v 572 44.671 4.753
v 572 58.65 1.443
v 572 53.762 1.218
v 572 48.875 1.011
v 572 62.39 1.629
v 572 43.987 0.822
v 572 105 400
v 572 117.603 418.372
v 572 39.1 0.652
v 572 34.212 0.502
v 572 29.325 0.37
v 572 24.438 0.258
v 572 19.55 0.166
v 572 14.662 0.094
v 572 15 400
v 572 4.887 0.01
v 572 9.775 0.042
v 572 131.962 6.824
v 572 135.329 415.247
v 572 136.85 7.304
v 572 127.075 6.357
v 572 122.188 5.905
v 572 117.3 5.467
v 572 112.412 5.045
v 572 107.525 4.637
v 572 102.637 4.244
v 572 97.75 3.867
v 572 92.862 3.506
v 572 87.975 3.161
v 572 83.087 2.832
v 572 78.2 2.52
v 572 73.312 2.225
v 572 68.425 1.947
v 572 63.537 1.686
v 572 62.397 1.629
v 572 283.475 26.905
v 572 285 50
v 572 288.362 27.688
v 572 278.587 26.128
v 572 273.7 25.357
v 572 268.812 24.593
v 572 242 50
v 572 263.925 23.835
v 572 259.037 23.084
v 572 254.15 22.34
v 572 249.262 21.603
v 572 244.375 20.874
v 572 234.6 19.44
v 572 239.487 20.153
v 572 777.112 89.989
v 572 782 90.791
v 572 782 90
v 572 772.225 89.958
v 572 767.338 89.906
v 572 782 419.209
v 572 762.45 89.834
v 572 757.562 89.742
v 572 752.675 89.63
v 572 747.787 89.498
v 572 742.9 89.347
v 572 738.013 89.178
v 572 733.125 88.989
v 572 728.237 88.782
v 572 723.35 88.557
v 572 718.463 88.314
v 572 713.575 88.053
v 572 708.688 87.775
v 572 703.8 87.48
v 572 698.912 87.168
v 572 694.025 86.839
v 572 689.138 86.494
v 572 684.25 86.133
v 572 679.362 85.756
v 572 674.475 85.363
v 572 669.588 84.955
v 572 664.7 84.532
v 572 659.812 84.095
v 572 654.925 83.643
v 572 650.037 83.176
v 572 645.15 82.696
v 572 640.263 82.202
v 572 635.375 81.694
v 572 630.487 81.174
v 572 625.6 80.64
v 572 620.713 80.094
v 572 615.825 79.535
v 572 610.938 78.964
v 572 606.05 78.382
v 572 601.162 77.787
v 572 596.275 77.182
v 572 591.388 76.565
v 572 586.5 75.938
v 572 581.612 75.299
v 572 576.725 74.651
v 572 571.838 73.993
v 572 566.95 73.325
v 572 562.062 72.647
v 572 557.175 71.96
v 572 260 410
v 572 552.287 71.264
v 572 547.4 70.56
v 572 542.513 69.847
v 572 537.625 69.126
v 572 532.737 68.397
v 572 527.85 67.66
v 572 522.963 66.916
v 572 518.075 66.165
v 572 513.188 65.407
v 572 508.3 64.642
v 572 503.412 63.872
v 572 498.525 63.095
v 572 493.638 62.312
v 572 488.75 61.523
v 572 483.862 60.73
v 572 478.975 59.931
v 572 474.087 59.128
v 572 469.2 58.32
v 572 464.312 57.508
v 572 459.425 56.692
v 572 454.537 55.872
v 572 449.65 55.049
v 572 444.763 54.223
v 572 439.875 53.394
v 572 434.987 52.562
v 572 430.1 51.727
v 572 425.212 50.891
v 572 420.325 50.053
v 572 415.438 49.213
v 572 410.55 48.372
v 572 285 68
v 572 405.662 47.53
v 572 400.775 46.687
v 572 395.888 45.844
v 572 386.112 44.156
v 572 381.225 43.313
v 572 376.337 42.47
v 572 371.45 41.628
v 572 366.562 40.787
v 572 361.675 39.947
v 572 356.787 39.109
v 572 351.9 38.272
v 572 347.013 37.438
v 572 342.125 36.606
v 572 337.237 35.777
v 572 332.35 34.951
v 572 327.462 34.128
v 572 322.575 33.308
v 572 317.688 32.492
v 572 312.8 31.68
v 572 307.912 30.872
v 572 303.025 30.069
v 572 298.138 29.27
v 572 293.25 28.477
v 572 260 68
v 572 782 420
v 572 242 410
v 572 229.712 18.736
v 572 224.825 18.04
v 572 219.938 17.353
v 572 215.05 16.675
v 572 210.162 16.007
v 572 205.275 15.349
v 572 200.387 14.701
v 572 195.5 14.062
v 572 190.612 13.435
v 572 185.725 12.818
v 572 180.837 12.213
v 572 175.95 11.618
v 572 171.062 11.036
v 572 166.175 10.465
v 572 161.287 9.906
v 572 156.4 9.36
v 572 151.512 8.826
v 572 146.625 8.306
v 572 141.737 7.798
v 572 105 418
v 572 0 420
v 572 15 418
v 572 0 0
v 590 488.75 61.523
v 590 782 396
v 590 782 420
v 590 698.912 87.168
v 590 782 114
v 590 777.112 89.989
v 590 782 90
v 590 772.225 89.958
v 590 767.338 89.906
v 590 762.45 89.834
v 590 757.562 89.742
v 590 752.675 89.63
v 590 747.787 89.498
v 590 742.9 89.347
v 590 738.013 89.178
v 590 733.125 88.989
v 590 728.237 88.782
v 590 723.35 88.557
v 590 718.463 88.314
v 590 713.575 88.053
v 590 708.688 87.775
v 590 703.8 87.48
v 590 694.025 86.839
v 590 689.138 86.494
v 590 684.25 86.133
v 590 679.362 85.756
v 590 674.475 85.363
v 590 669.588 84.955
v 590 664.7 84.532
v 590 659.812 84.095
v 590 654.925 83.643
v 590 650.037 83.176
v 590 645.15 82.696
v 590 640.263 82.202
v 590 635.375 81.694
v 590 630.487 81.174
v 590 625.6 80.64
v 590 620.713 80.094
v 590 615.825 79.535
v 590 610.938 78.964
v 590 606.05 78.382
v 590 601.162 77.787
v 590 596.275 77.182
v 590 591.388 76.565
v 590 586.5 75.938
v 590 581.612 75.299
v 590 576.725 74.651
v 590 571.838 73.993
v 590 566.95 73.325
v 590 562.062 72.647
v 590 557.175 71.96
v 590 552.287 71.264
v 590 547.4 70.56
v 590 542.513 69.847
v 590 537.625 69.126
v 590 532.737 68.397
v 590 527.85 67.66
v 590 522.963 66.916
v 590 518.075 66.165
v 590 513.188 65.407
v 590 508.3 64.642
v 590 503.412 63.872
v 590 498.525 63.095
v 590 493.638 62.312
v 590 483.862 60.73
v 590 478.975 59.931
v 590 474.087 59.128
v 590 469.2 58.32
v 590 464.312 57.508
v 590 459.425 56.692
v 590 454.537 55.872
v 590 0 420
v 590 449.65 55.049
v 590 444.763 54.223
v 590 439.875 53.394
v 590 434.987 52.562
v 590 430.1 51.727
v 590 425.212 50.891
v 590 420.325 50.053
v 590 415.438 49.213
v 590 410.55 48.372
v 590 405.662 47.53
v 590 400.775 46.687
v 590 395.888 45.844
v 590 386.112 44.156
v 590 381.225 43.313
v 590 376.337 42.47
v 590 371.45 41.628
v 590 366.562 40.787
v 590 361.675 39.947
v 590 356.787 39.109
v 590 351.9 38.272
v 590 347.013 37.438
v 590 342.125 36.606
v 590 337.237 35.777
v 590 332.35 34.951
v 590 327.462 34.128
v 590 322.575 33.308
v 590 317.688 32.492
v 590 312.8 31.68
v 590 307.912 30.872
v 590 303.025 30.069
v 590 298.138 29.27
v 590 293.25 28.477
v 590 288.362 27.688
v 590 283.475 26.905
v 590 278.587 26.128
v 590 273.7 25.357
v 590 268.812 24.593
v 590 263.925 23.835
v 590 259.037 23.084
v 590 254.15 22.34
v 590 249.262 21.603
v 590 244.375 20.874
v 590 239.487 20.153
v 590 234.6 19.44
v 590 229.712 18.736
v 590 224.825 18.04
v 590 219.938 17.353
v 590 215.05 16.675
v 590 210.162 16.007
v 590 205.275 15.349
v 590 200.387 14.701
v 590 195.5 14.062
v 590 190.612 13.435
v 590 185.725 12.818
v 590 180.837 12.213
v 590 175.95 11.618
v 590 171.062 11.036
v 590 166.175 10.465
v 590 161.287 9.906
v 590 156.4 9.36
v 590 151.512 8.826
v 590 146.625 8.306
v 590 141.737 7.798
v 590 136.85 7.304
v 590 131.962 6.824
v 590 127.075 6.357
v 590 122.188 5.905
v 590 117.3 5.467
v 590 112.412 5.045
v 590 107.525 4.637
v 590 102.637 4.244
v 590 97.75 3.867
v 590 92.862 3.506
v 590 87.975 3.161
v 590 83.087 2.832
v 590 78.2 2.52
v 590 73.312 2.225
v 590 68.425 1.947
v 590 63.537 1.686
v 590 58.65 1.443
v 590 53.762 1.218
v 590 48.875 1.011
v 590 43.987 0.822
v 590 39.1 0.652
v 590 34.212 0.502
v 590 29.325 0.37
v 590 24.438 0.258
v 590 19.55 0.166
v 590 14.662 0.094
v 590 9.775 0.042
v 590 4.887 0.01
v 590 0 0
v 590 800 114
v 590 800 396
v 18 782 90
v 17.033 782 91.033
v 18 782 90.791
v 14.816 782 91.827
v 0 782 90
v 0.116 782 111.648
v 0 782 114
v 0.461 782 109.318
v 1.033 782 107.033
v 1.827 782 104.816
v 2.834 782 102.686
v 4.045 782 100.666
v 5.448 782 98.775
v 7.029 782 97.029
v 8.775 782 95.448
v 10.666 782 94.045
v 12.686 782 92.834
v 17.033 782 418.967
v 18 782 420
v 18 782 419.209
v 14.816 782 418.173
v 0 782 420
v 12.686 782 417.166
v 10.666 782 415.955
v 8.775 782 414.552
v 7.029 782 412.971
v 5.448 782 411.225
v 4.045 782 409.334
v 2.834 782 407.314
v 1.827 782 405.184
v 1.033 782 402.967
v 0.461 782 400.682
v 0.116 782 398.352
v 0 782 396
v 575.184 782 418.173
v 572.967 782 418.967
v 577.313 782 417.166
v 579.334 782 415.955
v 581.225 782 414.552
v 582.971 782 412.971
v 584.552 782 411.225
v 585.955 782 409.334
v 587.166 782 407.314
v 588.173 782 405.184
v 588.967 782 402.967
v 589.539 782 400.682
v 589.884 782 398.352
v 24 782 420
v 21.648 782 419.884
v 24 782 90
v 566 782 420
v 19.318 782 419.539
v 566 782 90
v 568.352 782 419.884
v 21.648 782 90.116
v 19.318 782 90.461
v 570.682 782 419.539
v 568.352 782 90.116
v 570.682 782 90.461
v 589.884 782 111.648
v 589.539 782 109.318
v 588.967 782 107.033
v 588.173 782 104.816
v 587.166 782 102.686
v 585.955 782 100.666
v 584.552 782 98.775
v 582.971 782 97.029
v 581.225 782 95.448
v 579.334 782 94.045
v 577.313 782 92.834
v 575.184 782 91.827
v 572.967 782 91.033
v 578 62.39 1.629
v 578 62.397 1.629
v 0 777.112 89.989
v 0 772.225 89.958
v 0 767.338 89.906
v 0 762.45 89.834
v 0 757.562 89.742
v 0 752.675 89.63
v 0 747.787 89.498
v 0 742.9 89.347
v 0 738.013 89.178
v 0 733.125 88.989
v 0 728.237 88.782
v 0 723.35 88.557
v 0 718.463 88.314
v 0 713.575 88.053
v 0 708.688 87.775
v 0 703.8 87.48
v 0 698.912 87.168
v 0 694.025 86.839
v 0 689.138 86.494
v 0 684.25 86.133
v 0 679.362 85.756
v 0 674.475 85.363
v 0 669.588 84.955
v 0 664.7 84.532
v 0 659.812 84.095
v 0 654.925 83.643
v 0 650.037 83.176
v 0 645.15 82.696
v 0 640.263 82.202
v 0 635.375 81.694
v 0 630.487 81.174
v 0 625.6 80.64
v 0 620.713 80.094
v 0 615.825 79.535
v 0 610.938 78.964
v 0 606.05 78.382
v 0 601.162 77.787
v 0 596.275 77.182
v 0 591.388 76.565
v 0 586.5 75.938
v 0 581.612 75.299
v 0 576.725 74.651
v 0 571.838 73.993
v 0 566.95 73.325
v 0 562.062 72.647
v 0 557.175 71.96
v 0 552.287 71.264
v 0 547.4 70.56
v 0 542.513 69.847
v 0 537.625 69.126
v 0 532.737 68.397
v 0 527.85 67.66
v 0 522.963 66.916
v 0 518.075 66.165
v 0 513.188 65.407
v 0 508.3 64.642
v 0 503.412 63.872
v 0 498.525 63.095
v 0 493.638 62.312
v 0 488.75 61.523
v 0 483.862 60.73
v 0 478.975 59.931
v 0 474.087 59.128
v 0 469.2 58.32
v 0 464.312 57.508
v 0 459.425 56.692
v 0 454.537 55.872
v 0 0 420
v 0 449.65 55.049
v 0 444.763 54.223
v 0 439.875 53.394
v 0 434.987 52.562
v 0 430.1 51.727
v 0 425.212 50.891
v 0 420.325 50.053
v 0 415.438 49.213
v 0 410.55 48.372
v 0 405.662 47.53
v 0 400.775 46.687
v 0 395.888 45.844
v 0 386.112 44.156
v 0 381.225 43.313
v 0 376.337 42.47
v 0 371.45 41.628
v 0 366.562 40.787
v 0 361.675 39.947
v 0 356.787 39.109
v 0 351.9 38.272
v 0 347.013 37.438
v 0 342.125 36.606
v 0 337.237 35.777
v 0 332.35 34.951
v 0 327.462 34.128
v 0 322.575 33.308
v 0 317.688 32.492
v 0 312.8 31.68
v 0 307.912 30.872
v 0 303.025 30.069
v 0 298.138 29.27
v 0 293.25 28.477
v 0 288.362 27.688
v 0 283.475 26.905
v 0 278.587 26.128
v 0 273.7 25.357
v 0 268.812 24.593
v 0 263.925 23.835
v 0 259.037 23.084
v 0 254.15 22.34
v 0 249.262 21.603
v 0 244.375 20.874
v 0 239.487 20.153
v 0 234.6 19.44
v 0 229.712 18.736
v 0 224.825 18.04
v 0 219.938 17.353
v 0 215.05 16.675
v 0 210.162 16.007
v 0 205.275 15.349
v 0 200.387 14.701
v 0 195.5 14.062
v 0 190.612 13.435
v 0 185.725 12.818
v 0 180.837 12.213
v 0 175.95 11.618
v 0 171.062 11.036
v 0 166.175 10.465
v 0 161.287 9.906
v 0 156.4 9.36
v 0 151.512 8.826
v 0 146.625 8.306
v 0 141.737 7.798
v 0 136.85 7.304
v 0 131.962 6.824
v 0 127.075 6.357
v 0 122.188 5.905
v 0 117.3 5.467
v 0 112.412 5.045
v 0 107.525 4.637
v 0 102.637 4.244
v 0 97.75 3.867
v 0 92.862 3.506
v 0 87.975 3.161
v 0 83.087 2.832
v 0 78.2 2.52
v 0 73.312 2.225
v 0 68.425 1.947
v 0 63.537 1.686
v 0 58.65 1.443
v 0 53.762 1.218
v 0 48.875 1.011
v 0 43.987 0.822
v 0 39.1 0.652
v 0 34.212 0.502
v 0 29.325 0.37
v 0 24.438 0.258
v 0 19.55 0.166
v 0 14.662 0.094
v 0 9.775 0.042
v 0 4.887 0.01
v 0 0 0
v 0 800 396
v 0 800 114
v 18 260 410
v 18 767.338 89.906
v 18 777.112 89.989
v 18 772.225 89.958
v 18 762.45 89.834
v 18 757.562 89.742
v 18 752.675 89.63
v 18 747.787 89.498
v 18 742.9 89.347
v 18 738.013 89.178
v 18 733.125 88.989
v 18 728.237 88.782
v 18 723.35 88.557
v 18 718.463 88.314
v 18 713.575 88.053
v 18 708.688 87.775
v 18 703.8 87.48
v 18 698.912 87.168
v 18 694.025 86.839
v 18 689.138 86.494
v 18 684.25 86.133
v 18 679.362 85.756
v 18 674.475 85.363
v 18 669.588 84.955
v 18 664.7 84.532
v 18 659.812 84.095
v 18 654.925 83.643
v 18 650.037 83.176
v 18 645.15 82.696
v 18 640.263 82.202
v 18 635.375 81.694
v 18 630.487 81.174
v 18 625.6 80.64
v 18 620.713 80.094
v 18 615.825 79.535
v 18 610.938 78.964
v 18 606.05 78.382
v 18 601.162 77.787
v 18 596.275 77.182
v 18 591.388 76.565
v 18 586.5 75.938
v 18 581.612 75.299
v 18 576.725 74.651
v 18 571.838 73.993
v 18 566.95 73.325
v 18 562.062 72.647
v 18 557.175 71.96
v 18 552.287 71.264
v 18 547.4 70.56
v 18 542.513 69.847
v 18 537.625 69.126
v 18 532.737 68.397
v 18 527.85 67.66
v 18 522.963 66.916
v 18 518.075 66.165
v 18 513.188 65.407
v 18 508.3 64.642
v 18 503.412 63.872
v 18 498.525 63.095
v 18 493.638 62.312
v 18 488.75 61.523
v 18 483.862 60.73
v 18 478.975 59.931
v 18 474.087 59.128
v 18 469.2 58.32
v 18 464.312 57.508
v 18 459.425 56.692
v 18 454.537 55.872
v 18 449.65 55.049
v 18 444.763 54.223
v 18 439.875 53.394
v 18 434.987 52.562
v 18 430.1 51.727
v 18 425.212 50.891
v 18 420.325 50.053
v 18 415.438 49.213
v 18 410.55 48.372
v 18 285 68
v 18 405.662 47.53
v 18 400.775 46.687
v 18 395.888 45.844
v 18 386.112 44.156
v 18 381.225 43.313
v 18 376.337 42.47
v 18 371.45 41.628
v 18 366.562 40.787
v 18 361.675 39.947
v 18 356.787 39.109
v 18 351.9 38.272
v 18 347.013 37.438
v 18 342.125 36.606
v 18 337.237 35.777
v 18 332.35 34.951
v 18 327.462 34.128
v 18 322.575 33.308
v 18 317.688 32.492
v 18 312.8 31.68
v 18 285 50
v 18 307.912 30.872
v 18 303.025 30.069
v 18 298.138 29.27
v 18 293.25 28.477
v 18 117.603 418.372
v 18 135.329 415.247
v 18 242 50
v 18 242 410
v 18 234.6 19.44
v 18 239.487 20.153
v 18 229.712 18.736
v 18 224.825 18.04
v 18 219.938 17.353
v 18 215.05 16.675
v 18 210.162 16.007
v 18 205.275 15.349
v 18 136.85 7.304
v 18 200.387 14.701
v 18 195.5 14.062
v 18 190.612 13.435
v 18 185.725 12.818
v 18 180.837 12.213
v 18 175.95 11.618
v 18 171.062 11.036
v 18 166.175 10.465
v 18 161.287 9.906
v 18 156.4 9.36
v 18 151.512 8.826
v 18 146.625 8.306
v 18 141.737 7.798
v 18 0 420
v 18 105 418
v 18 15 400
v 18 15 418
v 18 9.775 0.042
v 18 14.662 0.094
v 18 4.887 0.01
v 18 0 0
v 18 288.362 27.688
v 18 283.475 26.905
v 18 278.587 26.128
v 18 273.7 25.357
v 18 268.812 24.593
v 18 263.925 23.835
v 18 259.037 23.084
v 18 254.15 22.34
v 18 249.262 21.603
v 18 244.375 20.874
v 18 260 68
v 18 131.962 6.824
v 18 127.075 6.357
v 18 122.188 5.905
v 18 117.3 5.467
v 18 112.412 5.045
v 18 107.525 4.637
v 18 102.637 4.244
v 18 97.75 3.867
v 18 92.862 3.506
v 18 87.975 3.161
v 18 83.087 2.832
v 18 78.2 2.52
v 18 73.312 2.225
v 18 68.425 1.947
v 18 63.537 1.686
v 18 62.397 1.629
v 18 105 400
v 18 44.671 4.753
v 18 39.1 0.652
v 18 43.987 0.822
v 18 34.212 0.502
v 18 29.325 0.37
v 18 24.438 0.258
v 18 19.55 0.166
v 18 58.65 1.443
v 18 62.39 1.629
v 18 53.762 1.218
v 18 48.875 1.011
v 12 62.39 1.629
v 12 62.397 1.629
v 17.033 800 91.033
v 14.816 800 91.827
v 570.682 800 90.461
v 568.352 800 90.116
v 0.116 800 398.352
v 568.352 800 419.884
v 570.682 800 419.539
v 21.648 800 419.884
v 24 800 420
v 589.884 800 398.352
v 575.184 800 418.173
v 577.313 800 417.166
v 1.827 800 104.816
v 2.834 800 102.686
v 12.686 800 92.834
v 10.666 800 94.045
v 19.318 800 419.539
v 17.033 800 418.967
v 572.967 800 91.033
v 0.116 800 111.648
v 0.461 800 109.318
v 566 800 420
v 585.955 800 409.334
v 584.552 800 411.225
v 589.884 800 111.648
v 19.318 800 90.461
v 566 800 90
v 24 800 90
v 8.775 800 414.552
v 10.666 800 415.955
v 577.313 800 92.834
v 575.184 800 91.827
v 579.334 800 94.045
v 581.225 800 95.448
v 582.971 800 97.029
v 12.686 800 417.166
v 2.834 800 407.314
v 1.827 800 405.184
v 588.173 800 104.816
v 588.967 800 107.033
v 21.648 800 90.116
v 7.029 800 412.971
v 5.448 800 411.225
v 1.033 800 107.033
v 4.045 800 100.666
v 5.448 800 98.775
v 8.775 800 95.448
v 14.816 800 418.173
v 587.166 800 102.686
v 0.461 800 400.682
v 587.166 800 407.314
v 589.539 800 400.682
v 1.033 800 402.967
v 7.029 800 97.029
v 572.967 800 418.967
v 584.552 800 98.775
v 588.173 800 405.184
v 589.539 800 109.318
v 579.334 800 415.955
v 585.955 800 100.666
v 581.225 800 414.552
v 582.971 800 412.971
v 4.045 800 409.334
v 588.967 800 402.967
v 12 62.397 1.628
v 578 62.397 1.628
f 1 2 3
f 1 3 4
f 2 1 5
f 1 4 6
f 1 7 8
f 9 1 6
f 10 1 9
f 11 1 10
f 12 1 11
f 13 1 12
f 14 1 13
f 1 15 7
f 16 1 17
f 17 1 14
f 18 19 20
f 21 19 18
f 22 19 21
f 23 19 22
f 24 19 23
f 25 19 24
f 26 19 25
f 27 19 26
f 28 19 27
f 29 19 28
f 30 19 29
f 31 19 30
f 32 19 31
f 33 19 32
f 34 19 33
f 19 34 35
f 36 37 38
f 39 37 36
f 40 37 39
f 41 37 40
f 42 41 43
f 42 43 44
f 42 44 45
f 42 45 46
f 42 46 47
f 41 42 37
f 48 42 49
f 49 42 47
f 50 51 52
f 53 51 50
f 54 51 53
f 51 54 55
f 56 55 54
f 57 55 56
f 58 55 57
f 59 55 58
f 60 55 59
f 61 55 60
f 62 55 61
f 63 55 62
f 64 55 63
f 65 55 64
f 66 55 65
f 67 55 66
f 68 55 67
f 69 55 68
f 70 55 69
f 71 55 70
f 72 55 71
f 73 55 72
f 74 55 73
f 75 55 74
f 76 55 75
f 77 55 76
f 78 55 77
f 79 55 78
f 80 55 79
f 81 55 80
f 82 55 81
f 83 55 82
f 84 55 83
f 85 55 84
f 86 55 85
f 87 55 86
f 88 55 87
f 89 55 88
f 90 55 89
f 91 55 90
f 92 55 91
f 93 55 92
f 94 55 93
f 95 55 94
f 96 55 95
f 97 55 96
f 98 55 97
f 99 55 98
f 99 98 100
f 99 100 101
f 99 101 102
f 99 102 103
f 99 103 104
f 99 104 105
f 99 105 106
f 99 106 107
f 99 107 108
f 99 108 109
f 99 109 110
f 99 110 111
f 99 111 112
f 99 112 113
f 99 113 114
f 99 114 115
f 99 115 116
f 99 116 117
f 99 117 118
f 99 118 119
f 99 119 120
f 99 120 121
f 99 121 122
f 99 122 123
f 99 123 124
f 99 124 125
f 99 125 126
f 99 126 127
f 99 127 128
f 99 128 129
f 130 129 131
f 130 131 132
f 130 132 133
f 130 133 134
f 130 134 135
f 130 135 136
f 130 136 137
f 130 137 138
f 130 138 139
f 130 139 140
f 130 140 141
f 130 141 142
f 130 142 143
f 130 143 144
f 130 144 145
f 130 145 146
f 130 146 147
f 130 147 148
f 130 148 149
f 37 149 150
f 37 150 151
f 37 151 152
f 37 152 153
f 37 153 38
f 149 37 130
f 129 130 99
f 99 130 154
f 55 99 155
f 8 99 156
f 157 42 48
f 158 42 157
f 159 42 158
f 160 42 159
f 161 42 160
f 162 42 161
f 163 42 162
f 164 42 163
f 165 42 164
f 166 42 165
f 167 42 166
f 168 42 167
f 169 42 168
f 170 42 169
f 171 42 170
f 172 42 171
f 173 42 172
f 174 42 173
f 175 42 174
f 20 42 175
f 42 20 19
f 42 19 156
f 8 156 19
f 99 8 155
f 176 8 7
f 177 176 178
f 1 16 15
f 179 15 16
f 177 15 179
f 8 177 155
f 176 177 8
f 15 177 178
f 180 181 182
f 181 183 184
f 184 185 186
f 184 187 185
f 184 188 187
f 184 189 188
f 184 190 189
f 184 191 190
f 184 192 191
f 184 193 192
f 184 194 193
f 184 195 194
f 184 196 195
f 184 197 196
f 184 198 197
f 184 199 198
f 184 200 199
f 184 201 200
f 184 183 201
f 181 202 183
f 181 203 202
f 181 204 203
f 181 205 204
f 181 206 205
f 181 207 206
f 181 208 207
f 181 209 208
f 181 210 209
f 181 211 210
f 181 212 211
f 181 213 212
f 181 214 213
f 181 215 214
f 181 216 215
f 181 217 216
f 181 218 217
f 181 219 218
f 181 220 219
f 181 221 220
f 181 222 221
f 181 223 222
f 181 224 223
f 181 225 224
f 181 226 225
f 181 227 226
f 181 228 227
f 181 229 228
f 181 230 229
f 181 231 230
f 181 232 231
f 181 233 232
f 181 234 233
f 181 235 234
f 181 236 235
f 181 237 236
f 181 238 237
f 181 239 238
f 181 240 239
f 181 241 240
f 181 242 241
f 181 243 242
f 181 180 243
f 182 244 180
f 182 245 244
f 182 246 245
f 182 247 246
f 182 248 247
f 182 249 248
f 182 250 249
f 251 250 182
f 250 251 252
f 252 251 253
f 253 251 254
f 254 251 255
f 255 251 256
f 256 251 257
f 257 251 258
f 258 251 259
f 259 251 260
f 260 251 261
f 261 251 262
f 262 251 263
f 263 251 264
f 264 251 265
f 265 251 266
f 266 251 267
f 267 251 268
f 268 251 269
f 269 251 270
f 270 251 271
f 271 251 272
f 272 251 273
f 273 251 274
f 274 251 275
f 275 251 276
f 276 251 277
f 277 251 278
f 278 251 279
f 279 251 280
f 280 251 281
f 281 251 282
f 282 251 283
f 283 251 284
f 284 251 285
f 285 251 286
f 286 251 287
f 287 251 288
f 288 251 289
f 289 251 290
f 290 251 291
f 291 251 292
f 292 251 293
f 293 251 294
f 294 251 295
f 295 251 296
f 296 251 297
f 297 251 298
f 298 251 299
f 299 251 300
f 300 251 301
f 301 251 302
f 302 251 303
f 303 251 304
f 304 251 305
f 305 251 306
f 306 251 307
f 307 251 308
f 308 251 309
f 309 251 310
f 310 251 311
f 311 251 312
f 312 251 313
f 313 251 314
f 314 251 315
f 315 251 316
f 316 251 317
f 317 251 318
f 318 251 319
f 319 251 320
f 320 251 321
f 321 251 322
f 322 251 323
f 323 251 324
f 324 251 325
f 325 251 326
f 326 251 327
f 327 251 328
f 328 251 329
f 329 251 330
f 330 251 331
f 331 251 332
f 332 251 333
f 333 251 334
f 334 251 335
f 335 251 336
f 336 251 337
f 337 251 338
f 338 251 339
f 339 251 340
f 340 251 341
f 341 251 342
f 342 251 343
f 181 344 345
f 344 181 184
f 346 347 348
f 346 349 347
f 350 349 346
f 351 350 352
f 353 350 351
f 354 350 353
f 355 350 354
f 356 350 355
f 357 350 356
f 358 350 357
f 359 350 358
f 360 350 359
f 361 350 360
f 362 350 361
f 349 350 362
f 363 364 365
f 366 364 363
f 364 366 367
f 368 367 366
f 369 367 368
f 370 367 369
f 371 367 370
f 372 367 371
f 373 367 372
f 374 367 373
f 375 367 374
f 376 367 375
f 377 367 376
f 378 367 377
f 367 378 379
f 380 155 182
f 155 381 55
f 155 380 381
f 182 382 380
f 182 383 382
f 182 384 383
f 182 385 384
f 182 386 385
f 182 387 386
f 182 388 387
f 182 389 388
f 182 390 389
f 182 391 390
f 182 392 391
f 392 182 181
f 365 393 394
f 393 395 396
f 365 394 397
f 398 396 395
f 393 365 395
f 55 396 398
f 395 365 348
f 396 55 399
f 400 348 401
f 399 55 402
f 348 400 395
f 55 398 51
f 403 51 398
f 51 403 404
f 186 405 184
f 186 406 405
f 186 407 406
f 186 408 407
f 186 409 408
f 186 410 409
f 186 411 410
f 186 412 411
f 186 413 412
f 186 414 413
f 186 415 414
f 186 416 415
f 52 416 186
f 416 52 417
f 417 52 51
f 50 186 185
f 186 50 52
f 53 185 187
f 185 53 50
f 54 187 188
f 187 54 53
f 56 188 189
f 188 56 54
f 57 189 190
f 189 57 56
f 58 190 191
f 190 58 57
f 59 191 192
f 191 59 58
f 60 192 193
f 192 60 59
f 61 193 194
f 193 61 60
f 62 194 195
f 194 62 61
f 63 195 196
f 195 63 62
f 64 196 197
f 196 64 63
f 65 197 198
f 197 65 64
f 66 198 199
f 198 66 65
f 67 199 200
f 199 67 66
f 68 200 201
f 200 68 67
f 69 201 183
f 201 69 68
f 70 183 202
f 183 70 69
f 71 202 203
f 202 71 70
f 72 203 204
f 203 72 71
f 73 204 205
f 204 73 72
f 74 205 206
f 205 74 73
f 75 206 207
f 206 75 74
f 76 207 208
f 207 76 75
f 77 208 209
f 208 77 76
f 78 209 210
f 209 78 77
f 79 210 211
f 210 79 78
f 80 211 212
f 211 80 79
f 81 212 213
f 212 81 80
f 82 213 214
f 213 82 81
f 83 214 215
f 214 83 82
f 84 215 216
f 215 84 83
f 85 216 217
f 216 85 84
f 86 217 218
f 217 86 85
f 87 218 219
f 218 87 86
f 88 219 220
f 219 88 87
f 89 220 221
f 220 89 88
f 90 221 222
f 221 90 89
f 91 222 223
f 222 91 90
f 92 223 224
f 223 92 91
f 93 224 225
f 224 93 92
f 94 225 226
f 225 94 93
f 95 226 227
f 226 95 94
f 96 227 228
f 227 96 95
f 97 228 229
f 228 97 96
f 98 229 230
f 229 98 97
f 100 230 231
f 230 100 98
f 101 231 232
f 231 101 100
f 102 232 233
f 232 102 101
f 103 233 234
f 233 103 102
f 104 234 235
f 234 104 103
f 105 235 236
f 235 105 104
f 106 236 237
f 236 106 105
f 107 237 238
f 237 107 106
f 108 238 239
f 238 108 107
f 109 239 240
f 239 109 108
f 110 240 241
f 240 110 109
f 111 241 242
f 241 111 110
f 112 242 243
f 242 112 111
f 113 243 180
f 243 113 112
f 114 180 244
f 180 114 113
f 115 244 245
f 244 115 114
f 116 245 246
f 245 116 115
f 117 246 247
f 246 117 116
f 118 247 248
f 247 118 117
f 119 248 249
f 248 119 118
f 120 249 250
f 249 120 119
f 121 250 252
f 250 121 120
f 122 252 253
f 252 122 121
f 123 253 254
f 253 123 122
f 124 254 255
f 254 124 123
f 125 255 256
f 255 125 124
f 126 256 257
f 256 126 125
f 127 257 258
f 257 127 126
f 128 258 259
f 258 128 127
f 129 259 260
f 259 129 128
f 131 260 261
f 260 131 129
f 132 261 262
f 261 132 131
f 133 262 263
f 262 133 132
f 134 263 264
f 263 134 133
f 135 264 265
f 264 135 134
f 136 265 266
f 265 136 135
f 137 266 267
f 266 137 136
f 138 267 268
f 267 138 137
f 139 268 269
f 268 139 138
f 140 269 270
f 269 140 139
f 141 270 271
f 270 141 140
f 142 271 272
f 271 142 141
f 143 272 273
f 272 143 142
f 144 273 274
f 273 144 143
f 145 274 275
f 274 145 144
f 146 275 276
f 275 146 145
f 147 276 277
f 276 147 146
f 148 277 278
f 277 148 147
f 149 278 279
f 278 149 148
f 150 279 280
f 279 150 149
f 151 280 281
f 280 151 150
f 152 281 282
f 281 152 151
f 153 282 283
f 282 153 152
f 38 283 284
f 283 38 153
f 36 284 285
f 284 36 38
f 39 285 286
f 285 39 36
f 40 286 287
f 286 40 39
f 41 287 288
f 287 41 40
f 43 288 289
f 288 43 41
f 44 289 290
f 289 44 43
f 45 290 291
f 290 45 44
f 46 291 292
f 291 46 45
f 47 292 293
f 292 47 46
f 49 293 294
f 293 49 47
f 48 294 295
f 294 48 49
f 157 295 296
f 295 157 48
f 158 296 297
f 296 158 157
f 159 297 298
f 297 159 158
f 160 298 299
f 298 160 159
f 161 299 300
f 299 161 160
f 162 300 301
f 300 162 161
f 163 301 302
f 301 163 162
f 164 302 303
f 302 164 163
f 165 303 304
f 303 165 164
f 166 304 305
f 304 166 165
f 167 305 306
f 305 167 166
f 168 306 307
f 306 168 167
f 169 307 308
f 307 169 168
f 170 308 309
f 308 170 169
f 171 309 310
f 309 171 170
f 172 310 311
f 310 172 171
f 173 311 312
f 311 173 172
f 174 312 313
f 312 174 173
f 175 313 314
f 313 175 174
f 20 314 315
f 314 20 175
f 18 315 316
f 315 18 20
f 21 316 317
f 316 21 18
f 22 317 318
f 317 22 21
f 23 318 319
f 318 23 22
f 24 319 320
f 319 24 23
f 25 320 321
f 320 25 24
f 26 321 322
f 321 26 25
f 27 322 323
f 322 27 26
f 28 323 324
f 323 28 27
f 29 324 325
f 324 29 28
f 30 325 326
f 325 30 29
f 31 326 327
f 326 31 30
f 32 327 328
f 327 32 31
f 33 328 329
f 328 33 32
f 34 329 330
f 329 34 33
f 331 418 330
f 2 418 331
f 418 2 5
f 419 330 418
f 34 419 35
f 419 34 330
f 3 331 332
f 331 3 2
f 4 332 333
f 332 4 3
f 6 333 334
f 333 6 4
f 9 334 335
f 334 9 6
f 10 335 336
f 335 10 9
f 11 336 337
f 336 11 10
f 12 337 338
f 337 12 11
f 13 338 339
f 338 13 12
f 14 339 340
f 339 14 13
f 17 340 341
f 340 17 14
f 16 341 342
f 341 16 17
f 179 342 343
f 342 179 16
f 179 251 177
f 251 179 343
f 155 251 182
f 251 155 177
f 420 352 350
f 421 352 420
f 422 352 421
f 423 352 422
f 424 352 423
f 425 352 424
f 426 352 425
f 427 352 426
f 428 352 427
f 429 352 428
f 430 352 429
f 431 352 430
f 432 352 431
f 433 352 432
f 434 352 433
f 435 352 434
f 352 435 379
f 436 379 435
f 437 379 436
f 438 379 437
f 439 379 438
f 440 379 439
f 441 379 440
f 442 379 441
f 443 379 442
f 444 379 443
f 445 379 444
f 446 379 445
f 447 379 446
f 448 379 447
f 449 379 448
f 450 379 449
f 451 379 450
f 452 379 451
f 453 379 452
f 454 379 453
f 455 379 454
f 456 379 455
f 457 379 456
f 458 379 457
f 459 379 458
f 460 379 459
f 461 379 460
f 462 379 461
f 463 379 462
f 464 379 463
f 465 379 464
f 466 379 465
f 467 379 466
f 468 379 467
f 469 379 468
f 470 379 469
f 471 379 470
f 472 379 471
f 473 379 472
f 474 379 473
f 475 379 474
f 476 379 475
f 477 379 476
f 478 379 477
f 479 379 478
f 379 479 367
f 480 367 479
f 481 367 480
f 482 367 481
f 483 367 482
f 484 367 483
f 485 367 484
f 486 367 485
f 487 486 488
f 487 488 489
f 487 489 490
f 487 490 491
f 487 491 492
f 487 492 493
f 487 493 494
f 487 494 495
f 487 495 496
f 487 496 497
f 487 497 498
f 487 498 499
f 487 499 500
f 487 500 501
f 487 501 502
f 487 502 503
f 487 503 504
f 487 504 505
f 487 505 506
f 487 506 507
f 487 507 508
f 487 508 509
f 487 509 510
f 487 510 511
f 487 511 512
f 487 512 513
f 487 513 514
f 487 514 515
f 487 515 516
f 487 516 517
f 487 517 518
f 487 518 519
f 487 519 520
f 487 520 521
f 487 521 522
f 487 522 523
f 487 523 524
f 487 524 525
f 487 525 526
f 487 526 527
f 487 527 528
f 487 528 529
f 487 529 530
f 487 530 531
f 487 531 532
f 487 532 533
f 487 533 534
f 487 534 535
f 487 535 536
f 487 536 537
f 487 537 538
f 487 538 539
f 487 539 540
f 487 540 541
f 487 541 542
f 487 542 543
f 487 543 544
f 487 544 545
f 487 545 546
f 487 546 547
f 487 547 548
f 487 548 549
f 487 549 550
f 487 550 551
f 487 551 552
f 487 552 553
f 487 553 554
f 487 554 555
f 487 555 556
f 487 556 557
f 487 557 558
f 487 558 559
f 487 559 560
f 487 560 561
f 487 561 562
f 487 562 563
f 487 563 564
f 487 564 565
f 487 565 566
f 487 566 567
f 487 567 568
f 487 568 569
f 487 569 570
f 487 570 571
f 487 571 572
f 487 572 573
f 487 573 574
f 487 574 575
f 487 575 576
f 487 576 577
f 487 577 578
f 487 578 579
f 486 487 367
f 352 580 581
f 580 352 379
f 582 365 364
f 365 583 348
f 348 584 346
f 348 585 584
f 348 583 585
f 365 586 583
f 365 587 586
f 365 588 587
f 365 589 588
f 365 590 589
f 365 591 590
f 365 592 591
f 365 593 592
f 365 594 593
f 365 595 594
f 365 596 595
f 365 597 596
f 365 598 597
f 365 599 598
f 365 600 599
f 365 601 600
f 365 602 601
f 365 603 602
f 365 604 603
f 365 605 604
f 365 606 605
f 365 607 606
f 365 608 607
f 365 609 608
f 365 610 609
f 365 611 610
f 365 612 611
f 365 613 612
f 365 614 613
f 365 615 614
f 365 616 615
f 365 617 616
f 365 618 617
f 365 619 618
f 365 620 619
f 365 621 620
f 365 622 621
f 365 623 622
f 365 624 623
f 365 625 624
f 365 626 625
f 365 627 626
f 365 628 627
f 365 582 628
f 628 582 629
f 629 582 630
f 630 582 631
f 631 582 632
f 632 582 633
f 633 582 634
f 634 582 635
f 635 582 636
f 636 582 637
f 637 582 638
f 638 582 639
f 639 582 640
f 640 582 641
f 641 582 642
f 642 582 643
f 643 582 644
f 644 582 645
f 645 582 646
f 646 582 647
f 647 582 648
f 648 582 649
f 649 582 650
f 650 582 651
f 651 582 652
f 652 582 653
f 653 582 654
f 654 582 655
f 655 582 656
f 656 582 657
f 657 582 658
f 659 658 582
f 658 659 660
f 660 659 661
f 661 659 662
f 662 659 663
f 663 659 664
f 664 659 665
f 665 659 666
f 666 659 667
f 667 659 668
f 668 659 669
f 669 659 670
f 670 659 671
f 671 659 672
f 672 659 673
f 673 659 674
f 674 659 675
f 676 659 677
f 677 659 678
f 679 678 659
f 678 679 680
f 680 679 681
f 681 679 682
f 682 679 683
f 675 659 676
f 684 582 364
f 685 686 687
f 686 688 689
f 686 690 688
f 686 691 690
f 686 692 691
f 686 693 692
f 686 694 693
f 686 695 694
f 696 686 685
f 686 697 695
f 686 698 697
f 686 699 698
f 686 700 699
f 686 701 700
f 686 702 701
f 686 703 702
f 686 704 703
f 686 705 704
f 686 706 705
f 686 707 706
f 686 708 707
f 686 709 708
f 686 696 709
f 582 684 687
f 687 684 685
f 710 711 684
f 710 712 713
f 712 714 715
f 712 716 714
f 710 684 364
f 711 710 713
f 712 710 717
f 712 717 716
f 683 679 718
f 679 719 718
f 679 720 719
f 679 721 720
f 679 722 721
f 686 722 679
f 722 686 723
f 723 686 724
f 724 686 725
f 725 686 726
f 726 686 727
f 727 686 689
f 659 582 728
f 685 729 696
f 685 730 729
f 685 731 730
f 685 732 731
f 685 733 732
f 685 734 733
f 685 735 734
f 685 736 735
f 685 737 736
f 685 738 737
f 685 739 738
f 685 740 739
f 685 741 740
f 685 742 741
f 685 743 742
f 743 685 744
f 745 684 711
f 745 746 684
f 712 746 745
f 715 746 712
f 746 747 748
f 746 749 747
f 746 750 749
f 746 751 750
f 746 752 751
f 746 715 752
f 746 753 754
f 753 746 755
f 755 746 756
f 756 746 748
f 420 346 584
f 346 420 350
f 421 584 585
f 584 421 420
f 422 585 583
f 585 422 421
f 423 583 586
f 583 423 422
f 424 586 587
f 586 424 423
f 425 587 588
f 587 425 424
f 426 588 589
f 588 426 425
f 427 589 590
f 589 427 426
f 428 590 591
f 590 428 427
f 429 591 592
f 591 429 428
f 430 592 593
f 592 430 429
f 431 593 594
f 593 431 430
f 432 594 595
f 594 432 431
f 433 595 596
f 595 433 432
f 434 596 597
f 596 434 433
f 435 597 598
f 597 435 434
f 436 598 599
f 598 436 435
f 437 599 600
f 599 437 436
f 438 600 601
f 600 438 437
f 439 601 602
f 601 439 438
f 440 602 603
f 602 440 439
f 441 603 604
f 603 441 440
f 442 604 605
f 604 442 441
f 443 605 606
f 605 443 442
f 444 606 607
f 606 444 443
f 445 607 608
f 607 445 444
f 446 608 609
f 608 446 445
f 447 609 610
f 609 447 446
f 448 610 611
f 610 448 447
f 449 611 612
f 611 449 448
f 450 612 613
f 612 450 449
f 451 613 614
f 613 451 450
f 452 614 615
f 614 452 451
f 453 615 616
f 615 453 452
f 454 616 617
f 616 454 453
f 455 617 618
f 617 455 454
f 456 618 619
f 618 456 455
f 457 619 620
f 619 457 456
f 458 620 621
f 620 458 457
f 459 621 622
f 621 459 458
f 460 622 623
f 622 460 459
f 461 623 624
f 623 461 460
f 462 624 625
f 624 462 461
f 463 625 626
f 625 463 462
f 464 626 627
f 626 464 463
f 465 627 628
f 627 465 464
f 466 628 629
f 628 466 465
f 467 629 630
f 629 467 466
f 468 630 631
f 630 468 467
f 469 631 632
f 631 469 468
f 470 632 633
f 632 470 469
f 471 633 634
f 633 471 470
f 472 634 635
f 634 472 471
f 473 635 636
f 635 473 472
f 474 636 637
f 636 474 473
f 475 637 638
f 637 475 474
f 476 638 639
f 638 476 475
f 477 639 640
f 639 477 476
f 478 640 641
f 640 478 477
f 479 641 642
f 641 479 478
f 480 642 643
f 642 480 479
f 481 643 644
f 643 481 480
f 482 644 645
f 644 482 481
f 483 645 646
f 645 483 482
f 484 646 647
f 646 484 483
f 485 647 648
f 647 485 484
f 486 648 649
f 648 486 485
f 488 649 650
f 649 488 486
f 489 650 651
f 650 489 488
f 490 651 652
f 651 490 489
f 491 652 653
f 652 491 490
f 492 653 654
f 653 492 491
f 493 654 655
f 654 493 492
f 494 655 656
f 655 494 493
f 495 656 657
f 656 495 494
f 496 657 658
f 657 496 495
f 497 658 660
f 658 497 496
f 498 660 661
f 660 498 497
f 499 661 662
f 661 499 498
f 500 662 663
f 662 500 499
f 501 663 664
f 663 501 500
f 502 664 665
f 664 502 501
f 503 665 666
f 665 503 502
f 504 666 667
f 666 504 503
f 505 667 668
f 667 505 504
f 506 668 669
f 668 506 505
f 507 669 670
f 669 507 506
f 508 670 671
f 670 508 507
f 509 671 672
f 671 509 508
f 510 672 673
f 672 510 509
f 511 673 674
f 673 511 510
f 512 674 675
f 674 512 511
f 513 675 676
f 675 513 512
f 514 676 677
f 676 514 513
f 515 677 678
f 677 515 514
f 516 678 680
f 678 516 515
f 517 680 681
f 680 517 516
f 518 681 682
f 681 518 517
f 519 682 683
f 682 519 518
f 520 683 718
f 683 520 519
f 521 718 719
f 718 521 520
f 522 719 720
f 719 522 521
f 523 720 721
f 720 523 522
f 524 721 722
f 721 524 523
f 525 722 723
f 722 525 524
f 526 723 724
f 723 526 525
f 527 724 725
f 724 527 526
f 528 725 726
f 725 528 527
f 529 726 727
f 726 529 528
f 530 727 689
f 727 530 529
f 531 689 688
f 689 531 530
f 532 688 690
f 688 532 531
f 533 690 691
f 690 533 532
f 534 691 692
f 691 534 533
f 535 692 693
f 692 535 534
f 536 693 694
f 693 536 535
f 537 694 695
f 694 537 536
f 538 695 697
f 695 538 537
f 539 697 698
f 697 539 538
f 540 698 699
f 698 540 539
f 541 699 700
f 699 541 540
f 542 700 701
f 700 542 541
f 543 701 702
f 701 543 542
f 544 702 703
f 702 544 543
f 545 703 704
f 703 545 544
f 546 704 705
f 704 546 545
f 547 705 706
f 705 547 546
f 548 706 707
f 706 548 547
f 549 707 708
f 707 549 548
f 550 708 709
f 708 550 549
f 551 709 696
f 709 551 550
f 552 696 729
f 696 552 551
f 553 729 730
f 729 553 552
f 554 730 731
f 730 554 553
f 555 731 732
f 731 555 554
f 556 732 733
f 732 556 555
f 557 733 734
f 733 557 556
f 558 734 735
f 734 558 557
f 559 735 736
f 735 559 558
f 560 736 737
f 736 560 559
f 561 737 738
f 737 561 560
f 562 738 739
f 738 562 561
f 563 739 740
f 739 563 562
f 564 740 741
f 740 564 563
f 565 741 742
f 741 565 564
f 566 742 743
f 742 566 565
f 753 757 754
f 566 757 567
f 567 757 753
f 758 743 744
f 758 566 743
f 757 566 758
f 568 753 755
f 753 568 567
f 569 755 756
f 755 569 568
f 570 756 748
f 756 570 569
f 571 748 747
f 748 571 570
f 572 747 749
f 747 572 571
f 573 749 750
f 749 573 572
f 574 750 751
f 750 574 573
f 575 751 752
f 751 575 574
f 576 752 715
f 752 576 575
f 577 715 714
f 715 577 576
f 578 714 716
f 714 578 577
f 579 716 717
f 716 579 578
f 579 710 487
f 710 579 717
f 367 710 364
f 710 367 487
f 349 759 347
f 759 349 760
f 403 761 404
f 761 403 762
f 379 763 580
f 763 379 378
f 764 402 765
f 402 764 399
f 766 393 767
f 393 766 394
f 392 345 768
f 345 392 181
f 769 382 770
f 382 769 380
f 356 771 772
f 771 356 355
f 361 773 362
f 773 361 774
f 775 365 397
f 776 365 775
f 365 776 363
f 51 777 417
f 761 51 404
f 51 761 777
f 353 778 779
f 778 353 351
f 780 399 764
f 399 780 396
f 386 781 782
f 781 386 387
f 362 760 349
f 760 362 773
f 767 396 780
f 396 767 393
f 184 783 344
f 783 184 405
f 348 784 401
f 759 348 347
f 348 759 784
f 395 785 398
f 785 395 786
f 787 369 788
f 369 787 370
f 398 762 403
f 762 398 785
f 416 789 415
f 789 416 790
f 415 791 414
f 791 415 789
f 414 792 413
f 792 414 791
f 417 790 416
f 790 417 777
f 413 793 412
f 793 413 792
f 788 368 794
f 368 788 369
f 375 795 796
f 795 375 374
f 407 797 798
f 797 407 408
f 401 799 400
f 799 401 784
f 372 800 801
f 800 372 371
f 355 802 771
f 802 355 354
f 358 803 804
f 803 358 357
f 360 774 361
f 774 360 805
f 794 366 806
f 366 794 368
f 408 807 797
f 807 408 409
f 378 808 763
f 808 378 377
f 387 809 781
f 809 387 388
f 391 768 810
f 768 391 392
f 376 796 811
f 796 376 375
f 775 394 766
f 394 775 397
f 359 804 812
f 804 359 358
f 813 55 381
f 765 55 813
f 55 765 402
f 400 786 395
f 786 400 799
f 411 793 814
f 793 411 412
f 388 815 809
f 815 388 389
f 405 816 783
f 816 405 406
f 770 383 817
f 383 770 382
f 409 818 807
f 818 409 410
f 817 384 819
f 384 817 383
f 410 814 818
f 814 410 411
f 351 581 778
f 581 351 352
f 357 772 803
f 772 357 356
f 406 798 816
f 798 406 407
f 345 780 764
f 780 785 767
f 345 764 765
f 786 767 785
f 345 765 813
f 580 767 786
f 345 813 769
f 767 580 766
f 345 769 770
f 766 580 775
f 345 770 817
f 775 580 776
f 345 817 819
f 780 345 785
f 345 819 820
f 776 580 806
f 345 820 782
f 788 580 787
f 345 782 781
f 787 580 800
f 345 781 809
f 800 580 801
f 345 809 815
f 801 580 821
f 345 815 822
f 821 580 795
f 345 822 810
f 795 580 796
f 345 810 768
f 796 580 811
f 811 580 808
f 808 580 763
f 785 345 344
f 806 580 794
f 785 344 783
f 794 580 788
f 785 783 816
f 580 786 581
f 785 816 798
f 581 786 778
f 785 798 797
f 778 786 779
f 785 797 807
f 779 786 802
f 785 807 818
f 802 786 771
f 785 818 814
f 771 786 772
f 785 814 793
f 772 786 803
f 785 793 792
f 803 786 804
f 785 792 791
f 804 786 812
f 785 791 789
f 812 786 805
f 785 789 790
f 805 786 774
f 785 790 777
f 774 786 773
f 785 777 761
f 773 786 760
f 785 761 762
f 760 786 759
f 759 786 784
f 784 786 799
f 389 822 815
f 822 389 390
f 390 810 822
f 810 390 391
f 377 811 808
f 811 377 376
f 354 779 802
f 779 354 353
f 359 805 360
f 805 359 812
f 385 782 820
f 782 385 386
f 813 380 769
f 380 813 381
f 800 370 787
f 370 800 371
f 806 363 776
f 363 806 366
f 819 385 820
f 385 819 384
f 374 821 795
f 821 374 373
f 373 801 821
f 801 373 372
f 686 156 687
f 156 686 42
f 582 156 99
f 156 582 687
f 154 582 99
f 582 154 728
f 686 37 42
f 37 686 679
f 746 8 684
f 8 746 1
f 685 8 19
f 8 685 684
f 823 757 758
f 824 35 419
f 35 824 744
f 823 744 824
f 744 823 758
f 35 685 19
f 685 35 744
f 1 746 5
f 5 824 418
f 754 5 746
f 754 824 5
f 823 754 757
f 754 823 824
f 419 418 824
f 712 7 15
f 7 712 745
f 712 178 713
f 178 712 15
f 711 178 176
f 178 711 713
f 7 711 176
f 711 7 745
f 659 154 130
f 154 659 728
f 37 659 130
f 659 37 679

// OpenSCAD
// R5. Millimetres. Nominal assembly; dado machining not modelled.
multmatrix([[0, 0, 1, 572], [0, 1, 0, 0], [1, 0, 0, 0], [0, 0, 0, 1]]) linear_extrude(height=18) polygon([[0.0, 0.0], [0.010503, 4.8875], [0.041836, 9.775], [0.093735, 14.6625], [0.165938, 19.55], [0.258179, 24.4375], [0.370195, 29.325], [0.501724, 34.2125], [0.6525, 39.1], [0.822261, 43.9875], [1.010742, 48.875], [1.217681, 53.7625], [1.442813, 58.65], [1.685874, 63.5375], [1.946602, 68.425], [2.224731, 73.3125], [2.52, 78.2], [2.832144, 83.0875], [3.160898, 87.975], [3.506001, 92.8625], [3.867188, 97.75], [4.244194, 102.6375], [4.636758, 107.525], [5.044614, 112.4125], [5.4675, 117.3], [5.905151, 122.1875], [6.357305, 127.075], [6.823696, 131.9625], [7.304062, 136.85], [7.79814, 141.7375], [8.305664, 146.625], [8.826372, 151.5125], [9.36, 156.4], [9.906284, 161.2875], [10.464961, 166.175], [11.035767, 171.0625], [11.618438, 175.95], [12.21271, 180.8375], [12.81832, 185.725], [13.435005, 190.6125], [14.0625, 195.5], [14.700542, 200.3875], [15.348867, 205.275], [16.007212, 210.1625], [16.675313, 215.05], [17.352905, 219.9375], [18.039727, 224.825], [18.735513, 229.7125], [19.44, 234.6], [20.152925, 239.4875], [20.874023, 244.375], [21.603032, 249.2625], [22.339688, 254.15], [23.083726, 259.0375], [23.834883, 263.925], [24.592896, 268.8125], [25.3575, 273.7], [26.128433, 278.5875], [26.90543, 283.475], [27.688228, 288.3625], [28.476562, 293.25], [29.270171, 298.1375], [30.068789, 303.025], [30.872153, 307.9125], [31.68, 312.8], [32.492065, 317.6875], [33.308086, 322.575], [34.127798, 327.4625], [34.950937, 332.35], [35.777241, 337.2375], [36.606445, 342.125], [37.438286, 347.0125], [38.2725, 351.9], [39.108823, 356.7875], [39.946992, 361.675], [40.786743, 366.5625], [41.627812, 371.45], [42.469937, 376.3375], [43.312852, 381.225], [44.156294, 386.1125], [45.0, 391.0], [45.843706, 395.8875], [46.687148, 400.775], [47.530063, 405.6625], [48.372188, 410.55], [49.213257, 415.4375], [50.053008, 420.325], [50.891177, 425.2125], [51.7275, 430.1], [52.561714, 434.9875], [53.393555, 439.875], [54.222759, 444.7625], [55.049062, 449.65], [55.872202, 454.5375], [56.691914, 459.425], [57.507935, 464.3125], [58.32, 469.2], [59.127847, 474.0875], [59.931211, 478.975], [60.729829, 483.8625], [61.523438, 488.75], [62.311772, 493.6375], [63.09457, 498.525], [63.871567, 503.4125], [64.6425, 508.3], [65.407104, 513.1875], [66.165117, 518.075], [66.916274, 522.9625], [67.660313, 527.85], [68.396968, 532.7375], [69.125977, 537.625], [69.847075, 542.5125], [70.56, 547.4], [71.264487, 552.2875], [71.960273, 557.175], [72.647095, 562.0625], [73.324688, 566.95], [73.992788, 571.8375], [74.651133, 576.725], [75.299458, 581.6125], [75.9375, 586.5], [76.564995, 591.3875], [77.18168, 596.275], [77.78729, 601.1625], [78.381563, 606.05], [78.964233, 610.9375], [79.535039, 615.825], [80.093716, 620.7125], [80.64, 625.6], [81.173628, 630.4875], [81.694336, 635.375], [82.20186, 640.2625], [82.695937, 645.15], [83.176304, 650.0375], [83.642695, 654.925], [84.094849, 659.8125], [84.5325, 664.7], [84.955386, 669.5875], [85.363242, 674.475], [85.755806, 679.3625], [86.132812, 684.25], [86.493999, 689.1375], [86.839102, 694.025], [87.167856, 698.9125], [87.48, 703.8], [87.775269, 708.6875], [88.053398, 713.575], [88.314126, 718.4625], [88.557188, 723.35], [88.782319, 728.2375], [88.989258, 733.125], [89.177739, 738.0125], [89.3475, 742.9], [89.498276, 747.7875], [89.629805, 752.675], [89.741821, 757.5625], [89.834063, 762.45], [89.906265, 767.3375], [89.958164, 772.225], [89.989497, 777.1125], [90.0, 782.0], [420, 782], [420, 0]]);
multmatrix([[0, 0, 1, 0], [0, 1, 0, 0], [1, 0, 0, 0], [0, 0, 0, 1]]) linear_extrude(height=18) polygon([[0.0, 0.0], [0.010503, 4.8875], [0.041836, 9.775], [0.093735, 14.6625], [0.165938, 19.55], [0.258179, 24.4375], [0.370195, 29.325], [0.501724, 34.2125], [0.6525, 39.1], [0.822261, 43.9875], [1.010742, 48.875], [1.217681, 53.7625], [1.442813, 58.65], [1.685874, 63.5375], [1.946602, 68.425], [2.224731, 73.3125], [2.52, 78.2], [2.832144, 83.0875], [3.160898, 87.975], [3.506001, 92.8625], [3.867188, 97.75], [4.244194, 102.6375], [4.636758, 107.525], [5.044614, 112.4125], [5.4675, 117.3], [5.905151, 122.1875], [6.357305, 127.075], [6.823696, 131.9625], [7.304062, 136.85], [7.79814, 141.7375], [8.305664, 146.625], [8.826372, 151.5125], [9.36, 156.4], [9.906284, 161.2875], [10.464961, 166.175], [11.035767, 171.0625], [11.618438, 175.95], [12.21271, 180.8375], [12.81832, 185.725], [13.435005, 190.6125], [14.0625, 195.5], [14.700542, 200.3875], [15.348867, 205.275], [16.007212, 210.1625], [16.675313, 215.05], [17.352905, 219.9375], [18.039727, 224.825], [18.735513, 229.7125], [19.44, 234.6], [20.152925, 239.4875], [20.874023, 244.375], [21.603032, 249.2625], [22.339688, 254.15], [23.083726, 259.0375], [23.834883, 263.925], [24.592896, 268.8125], [25.3575, 273.7], [26.128433, 278.5875], [26.90543, 283.475], [27.688228, 288.3625], [28.476562, 293.25], [29.270171, 298.1375], [30.068789, 303.025], [30.872153, 307.9125], [31.68, 312.8], [32.492065, 317.6875], [33.308086, 322.575], [34.127798, 327.4625], [34.950937, 332.35], [35.777241, 337.2375], [36.606445, 342.125], [37.438286, 347.0125], [38.2725, 351.9], [39.108823, 356.7875], [39.946992, 361.675], [40.786743, 366.5625], [41.627812, 371.45], [42.469937, 376.3375], [43.312852, 381.225], [44.156294, 386.1125], [45.0, 391.0], [45.843706, 395.8875], [46.687148, 400.775], [47.530063, 405.6625], [48.372188, 410.55], [49.213257, 415.4375], [50.053008, 420.325], [50.891177, 425.2125], [51.7275, 430.1], [52.561714, 434.9875], [53.393555, 439.875], [54.222759, 444.7625], [55.049062, 449.65], [55.872202, 454.5375], [56.691914, 459.425], [57.507935, 464.3125], [58.32, 469.2], [59.127847, 474.0875], [59.931211, 478.975], [60.729829, 483.8625], [61.523438, 488.75], [62.311772, 493.6375], [63.09457, 498.525], [63.871567, 503.4125], [64.6425, 508.3], [65.407104, 513.1875], [66.165117, 518.075], [66.916274, 522.9625], [67.660313, 527.85], [68.396968, 532.7375], [69.125977, 537.625], [69.847075, 542.5125], [70.56, 547.4], [71.264487, 552.2875], [71.960273, 557.175], [72.647095, 562.0625], [73.324688, 566.95], [73.992788, 571.8375], [74.651133, 576.725], [75.299458, 581.6125], [75.9375, 586.5], [76.564995, 591.3875], [77.18168, 596.275], [77.78729, 601.1625], [78.381563, 606.05], [78.964233, 610.9375], [79.535039, 615.825], [80.093716, 620.7125], [80.64, 625.6], [81.173628, 630.4875], [81.694336, 635.375], [82.20186, 640.2625], [82.695937, 645.15], [83.176304, 650.0375], [83.642695, 654.925], [84.094849, 659.8125], [84.5325, 664.7], [84.955386, 669.5875], [85.363242, 674.475], [85.755806, 679.3625], [86.132812, 684.25], [86.493999, 689.1375], [86.839102, 694.025], [87.167856, 698.9125], [87.48, 703.8], [87.775269, 708.6875], [88.053398, 713.575], [88.314126, 718.4625], [88.557188, 723.35], [88.782319, 728.2375], [88.989258, 733.125], [89.177739, 738.0125], [89.3475, 742.9], [89.498276, 747.7875], [89.629805, 752.675], [89.741821, 757.5625], [89.834063, 762.45], [89.906265, 767.3375], [89.958164, 772.225], [89.989497, 777.1125], [90.0, 782.0], [420, 782], [420, 0]]);
multmatrix([[1, 0, 0, 0.0], [0, -0.0, 1.0, 782.0], [0, 1.0, 0.0, 90.0], [0, 0, 0, 1]]) linear_extrude(height=18) polygon([[0.0, 24.0], [0.115567, 21.647589], [0.461153, 19.317832], [1.033432, 17.033168], [1.826891, 14.815598], [2.83389, 12.686478], [4.044729, 10.666314], [5.447749, 8.774561], [7.029437, 7.029437], [8.774561, 5.447749], [10.666314, 4.044729], [12.686478, 2.83389], [14.815598, 1.826891], [17.033168, 1.033432], [19.317832, 0.461153], [21.647589, 0.115567], [24.0, 0.0], [566.0, 0.0], [568.352411, 0.115567], [570.682168, 0.461153], [572.966832, 1.033432], [575.184402, 1.826891], [577.313522, 2.83389], [579.333686, 4.044729], [581.225439, 5.447749], [582.970563, 7.029437], [584.552251, 8.774561], [585.955271, 10.666314], [587.16611, 12.686478], [588.173109, 14.815598], [588.966568, 17.033168], [589.538847, 19.317832], [589.884433, 21.647589], [590.0, 24.0], [590.0, 306.0], [589.884433, 308.352411], [589.538847, 310.682168], [588.966568, 312.966832], [588.173109, 315.184402], [587.16611, 317.313522], [585.955271, 319.333686], [584.552251, 321.225439], [582.970563, 322.970563], [581.225439, 324.552251], [579.333686, 325.955271], [577.313522, 327.16611], [575.184402, 328.173109], [572.966832, 328.966568], [570.682168, 329.538847], [568.352411, 329.884433], [566.0, 330.0], [24.0, 330.0], [21.647589, 329.884433], [19.317832, 329.538847], [17.033168, 328.966568], [14.815598, 328.173109], [12.686478, 327.16611], [10.666314, 325.955271], [8.774561, 324.552251], [7.029437, 322.970563], [5.447749, 321.225439], [4.044729, 319.333686], [2.83389, 317.313522], [1.826891, 315.184402], [1.033432, 312.966832], [0.461153, 310.682168], [0.115567, 308.352411], [0.0, 306.0]]);
multmatrix([[1, 0, 0, 12.0], [0, -0.0, 1.0, 242.0], [0, 1.0, 0.0, 50.0], [0, 0, 0, 1]]) linear_extrude(height=18) polygon([[0, 0], [566, 0], [566, 360], [0, 360]]);
multmatrix([[1, 0, 0, 12.0], [0, 0.17364817766693033, 0.984807753012208, 44.67061291283476], [0, 0.984807753012208, -0.17364817766693033, 4.7532054664386845], [0, 0, 0, 1]]) linear_extrude(height=18) polygon([[0, 0], [566, 0], [566, 420], [0, 420]]);
multmatrix([[1, 0, 0, 12.0], [0, 1.0, -0.0, 15.0], [0, 0.0, 1.0, 400.0], [0, 0, 0, 1]]) linear_extrude(height=18) polygon([[0, 0], [566, 0], [566, 90], [0, 90]]);
multmatrix([[1, 0, 0, 12.0], [0, 1.0, -0.0, 260.0], [0, 0.0, 1.0, 50.0], [0, 0, 0, 1]]) linear_extrude(height=18) polygon([[0, 0], [566, 0], [566, 25], [0, 25]]);
